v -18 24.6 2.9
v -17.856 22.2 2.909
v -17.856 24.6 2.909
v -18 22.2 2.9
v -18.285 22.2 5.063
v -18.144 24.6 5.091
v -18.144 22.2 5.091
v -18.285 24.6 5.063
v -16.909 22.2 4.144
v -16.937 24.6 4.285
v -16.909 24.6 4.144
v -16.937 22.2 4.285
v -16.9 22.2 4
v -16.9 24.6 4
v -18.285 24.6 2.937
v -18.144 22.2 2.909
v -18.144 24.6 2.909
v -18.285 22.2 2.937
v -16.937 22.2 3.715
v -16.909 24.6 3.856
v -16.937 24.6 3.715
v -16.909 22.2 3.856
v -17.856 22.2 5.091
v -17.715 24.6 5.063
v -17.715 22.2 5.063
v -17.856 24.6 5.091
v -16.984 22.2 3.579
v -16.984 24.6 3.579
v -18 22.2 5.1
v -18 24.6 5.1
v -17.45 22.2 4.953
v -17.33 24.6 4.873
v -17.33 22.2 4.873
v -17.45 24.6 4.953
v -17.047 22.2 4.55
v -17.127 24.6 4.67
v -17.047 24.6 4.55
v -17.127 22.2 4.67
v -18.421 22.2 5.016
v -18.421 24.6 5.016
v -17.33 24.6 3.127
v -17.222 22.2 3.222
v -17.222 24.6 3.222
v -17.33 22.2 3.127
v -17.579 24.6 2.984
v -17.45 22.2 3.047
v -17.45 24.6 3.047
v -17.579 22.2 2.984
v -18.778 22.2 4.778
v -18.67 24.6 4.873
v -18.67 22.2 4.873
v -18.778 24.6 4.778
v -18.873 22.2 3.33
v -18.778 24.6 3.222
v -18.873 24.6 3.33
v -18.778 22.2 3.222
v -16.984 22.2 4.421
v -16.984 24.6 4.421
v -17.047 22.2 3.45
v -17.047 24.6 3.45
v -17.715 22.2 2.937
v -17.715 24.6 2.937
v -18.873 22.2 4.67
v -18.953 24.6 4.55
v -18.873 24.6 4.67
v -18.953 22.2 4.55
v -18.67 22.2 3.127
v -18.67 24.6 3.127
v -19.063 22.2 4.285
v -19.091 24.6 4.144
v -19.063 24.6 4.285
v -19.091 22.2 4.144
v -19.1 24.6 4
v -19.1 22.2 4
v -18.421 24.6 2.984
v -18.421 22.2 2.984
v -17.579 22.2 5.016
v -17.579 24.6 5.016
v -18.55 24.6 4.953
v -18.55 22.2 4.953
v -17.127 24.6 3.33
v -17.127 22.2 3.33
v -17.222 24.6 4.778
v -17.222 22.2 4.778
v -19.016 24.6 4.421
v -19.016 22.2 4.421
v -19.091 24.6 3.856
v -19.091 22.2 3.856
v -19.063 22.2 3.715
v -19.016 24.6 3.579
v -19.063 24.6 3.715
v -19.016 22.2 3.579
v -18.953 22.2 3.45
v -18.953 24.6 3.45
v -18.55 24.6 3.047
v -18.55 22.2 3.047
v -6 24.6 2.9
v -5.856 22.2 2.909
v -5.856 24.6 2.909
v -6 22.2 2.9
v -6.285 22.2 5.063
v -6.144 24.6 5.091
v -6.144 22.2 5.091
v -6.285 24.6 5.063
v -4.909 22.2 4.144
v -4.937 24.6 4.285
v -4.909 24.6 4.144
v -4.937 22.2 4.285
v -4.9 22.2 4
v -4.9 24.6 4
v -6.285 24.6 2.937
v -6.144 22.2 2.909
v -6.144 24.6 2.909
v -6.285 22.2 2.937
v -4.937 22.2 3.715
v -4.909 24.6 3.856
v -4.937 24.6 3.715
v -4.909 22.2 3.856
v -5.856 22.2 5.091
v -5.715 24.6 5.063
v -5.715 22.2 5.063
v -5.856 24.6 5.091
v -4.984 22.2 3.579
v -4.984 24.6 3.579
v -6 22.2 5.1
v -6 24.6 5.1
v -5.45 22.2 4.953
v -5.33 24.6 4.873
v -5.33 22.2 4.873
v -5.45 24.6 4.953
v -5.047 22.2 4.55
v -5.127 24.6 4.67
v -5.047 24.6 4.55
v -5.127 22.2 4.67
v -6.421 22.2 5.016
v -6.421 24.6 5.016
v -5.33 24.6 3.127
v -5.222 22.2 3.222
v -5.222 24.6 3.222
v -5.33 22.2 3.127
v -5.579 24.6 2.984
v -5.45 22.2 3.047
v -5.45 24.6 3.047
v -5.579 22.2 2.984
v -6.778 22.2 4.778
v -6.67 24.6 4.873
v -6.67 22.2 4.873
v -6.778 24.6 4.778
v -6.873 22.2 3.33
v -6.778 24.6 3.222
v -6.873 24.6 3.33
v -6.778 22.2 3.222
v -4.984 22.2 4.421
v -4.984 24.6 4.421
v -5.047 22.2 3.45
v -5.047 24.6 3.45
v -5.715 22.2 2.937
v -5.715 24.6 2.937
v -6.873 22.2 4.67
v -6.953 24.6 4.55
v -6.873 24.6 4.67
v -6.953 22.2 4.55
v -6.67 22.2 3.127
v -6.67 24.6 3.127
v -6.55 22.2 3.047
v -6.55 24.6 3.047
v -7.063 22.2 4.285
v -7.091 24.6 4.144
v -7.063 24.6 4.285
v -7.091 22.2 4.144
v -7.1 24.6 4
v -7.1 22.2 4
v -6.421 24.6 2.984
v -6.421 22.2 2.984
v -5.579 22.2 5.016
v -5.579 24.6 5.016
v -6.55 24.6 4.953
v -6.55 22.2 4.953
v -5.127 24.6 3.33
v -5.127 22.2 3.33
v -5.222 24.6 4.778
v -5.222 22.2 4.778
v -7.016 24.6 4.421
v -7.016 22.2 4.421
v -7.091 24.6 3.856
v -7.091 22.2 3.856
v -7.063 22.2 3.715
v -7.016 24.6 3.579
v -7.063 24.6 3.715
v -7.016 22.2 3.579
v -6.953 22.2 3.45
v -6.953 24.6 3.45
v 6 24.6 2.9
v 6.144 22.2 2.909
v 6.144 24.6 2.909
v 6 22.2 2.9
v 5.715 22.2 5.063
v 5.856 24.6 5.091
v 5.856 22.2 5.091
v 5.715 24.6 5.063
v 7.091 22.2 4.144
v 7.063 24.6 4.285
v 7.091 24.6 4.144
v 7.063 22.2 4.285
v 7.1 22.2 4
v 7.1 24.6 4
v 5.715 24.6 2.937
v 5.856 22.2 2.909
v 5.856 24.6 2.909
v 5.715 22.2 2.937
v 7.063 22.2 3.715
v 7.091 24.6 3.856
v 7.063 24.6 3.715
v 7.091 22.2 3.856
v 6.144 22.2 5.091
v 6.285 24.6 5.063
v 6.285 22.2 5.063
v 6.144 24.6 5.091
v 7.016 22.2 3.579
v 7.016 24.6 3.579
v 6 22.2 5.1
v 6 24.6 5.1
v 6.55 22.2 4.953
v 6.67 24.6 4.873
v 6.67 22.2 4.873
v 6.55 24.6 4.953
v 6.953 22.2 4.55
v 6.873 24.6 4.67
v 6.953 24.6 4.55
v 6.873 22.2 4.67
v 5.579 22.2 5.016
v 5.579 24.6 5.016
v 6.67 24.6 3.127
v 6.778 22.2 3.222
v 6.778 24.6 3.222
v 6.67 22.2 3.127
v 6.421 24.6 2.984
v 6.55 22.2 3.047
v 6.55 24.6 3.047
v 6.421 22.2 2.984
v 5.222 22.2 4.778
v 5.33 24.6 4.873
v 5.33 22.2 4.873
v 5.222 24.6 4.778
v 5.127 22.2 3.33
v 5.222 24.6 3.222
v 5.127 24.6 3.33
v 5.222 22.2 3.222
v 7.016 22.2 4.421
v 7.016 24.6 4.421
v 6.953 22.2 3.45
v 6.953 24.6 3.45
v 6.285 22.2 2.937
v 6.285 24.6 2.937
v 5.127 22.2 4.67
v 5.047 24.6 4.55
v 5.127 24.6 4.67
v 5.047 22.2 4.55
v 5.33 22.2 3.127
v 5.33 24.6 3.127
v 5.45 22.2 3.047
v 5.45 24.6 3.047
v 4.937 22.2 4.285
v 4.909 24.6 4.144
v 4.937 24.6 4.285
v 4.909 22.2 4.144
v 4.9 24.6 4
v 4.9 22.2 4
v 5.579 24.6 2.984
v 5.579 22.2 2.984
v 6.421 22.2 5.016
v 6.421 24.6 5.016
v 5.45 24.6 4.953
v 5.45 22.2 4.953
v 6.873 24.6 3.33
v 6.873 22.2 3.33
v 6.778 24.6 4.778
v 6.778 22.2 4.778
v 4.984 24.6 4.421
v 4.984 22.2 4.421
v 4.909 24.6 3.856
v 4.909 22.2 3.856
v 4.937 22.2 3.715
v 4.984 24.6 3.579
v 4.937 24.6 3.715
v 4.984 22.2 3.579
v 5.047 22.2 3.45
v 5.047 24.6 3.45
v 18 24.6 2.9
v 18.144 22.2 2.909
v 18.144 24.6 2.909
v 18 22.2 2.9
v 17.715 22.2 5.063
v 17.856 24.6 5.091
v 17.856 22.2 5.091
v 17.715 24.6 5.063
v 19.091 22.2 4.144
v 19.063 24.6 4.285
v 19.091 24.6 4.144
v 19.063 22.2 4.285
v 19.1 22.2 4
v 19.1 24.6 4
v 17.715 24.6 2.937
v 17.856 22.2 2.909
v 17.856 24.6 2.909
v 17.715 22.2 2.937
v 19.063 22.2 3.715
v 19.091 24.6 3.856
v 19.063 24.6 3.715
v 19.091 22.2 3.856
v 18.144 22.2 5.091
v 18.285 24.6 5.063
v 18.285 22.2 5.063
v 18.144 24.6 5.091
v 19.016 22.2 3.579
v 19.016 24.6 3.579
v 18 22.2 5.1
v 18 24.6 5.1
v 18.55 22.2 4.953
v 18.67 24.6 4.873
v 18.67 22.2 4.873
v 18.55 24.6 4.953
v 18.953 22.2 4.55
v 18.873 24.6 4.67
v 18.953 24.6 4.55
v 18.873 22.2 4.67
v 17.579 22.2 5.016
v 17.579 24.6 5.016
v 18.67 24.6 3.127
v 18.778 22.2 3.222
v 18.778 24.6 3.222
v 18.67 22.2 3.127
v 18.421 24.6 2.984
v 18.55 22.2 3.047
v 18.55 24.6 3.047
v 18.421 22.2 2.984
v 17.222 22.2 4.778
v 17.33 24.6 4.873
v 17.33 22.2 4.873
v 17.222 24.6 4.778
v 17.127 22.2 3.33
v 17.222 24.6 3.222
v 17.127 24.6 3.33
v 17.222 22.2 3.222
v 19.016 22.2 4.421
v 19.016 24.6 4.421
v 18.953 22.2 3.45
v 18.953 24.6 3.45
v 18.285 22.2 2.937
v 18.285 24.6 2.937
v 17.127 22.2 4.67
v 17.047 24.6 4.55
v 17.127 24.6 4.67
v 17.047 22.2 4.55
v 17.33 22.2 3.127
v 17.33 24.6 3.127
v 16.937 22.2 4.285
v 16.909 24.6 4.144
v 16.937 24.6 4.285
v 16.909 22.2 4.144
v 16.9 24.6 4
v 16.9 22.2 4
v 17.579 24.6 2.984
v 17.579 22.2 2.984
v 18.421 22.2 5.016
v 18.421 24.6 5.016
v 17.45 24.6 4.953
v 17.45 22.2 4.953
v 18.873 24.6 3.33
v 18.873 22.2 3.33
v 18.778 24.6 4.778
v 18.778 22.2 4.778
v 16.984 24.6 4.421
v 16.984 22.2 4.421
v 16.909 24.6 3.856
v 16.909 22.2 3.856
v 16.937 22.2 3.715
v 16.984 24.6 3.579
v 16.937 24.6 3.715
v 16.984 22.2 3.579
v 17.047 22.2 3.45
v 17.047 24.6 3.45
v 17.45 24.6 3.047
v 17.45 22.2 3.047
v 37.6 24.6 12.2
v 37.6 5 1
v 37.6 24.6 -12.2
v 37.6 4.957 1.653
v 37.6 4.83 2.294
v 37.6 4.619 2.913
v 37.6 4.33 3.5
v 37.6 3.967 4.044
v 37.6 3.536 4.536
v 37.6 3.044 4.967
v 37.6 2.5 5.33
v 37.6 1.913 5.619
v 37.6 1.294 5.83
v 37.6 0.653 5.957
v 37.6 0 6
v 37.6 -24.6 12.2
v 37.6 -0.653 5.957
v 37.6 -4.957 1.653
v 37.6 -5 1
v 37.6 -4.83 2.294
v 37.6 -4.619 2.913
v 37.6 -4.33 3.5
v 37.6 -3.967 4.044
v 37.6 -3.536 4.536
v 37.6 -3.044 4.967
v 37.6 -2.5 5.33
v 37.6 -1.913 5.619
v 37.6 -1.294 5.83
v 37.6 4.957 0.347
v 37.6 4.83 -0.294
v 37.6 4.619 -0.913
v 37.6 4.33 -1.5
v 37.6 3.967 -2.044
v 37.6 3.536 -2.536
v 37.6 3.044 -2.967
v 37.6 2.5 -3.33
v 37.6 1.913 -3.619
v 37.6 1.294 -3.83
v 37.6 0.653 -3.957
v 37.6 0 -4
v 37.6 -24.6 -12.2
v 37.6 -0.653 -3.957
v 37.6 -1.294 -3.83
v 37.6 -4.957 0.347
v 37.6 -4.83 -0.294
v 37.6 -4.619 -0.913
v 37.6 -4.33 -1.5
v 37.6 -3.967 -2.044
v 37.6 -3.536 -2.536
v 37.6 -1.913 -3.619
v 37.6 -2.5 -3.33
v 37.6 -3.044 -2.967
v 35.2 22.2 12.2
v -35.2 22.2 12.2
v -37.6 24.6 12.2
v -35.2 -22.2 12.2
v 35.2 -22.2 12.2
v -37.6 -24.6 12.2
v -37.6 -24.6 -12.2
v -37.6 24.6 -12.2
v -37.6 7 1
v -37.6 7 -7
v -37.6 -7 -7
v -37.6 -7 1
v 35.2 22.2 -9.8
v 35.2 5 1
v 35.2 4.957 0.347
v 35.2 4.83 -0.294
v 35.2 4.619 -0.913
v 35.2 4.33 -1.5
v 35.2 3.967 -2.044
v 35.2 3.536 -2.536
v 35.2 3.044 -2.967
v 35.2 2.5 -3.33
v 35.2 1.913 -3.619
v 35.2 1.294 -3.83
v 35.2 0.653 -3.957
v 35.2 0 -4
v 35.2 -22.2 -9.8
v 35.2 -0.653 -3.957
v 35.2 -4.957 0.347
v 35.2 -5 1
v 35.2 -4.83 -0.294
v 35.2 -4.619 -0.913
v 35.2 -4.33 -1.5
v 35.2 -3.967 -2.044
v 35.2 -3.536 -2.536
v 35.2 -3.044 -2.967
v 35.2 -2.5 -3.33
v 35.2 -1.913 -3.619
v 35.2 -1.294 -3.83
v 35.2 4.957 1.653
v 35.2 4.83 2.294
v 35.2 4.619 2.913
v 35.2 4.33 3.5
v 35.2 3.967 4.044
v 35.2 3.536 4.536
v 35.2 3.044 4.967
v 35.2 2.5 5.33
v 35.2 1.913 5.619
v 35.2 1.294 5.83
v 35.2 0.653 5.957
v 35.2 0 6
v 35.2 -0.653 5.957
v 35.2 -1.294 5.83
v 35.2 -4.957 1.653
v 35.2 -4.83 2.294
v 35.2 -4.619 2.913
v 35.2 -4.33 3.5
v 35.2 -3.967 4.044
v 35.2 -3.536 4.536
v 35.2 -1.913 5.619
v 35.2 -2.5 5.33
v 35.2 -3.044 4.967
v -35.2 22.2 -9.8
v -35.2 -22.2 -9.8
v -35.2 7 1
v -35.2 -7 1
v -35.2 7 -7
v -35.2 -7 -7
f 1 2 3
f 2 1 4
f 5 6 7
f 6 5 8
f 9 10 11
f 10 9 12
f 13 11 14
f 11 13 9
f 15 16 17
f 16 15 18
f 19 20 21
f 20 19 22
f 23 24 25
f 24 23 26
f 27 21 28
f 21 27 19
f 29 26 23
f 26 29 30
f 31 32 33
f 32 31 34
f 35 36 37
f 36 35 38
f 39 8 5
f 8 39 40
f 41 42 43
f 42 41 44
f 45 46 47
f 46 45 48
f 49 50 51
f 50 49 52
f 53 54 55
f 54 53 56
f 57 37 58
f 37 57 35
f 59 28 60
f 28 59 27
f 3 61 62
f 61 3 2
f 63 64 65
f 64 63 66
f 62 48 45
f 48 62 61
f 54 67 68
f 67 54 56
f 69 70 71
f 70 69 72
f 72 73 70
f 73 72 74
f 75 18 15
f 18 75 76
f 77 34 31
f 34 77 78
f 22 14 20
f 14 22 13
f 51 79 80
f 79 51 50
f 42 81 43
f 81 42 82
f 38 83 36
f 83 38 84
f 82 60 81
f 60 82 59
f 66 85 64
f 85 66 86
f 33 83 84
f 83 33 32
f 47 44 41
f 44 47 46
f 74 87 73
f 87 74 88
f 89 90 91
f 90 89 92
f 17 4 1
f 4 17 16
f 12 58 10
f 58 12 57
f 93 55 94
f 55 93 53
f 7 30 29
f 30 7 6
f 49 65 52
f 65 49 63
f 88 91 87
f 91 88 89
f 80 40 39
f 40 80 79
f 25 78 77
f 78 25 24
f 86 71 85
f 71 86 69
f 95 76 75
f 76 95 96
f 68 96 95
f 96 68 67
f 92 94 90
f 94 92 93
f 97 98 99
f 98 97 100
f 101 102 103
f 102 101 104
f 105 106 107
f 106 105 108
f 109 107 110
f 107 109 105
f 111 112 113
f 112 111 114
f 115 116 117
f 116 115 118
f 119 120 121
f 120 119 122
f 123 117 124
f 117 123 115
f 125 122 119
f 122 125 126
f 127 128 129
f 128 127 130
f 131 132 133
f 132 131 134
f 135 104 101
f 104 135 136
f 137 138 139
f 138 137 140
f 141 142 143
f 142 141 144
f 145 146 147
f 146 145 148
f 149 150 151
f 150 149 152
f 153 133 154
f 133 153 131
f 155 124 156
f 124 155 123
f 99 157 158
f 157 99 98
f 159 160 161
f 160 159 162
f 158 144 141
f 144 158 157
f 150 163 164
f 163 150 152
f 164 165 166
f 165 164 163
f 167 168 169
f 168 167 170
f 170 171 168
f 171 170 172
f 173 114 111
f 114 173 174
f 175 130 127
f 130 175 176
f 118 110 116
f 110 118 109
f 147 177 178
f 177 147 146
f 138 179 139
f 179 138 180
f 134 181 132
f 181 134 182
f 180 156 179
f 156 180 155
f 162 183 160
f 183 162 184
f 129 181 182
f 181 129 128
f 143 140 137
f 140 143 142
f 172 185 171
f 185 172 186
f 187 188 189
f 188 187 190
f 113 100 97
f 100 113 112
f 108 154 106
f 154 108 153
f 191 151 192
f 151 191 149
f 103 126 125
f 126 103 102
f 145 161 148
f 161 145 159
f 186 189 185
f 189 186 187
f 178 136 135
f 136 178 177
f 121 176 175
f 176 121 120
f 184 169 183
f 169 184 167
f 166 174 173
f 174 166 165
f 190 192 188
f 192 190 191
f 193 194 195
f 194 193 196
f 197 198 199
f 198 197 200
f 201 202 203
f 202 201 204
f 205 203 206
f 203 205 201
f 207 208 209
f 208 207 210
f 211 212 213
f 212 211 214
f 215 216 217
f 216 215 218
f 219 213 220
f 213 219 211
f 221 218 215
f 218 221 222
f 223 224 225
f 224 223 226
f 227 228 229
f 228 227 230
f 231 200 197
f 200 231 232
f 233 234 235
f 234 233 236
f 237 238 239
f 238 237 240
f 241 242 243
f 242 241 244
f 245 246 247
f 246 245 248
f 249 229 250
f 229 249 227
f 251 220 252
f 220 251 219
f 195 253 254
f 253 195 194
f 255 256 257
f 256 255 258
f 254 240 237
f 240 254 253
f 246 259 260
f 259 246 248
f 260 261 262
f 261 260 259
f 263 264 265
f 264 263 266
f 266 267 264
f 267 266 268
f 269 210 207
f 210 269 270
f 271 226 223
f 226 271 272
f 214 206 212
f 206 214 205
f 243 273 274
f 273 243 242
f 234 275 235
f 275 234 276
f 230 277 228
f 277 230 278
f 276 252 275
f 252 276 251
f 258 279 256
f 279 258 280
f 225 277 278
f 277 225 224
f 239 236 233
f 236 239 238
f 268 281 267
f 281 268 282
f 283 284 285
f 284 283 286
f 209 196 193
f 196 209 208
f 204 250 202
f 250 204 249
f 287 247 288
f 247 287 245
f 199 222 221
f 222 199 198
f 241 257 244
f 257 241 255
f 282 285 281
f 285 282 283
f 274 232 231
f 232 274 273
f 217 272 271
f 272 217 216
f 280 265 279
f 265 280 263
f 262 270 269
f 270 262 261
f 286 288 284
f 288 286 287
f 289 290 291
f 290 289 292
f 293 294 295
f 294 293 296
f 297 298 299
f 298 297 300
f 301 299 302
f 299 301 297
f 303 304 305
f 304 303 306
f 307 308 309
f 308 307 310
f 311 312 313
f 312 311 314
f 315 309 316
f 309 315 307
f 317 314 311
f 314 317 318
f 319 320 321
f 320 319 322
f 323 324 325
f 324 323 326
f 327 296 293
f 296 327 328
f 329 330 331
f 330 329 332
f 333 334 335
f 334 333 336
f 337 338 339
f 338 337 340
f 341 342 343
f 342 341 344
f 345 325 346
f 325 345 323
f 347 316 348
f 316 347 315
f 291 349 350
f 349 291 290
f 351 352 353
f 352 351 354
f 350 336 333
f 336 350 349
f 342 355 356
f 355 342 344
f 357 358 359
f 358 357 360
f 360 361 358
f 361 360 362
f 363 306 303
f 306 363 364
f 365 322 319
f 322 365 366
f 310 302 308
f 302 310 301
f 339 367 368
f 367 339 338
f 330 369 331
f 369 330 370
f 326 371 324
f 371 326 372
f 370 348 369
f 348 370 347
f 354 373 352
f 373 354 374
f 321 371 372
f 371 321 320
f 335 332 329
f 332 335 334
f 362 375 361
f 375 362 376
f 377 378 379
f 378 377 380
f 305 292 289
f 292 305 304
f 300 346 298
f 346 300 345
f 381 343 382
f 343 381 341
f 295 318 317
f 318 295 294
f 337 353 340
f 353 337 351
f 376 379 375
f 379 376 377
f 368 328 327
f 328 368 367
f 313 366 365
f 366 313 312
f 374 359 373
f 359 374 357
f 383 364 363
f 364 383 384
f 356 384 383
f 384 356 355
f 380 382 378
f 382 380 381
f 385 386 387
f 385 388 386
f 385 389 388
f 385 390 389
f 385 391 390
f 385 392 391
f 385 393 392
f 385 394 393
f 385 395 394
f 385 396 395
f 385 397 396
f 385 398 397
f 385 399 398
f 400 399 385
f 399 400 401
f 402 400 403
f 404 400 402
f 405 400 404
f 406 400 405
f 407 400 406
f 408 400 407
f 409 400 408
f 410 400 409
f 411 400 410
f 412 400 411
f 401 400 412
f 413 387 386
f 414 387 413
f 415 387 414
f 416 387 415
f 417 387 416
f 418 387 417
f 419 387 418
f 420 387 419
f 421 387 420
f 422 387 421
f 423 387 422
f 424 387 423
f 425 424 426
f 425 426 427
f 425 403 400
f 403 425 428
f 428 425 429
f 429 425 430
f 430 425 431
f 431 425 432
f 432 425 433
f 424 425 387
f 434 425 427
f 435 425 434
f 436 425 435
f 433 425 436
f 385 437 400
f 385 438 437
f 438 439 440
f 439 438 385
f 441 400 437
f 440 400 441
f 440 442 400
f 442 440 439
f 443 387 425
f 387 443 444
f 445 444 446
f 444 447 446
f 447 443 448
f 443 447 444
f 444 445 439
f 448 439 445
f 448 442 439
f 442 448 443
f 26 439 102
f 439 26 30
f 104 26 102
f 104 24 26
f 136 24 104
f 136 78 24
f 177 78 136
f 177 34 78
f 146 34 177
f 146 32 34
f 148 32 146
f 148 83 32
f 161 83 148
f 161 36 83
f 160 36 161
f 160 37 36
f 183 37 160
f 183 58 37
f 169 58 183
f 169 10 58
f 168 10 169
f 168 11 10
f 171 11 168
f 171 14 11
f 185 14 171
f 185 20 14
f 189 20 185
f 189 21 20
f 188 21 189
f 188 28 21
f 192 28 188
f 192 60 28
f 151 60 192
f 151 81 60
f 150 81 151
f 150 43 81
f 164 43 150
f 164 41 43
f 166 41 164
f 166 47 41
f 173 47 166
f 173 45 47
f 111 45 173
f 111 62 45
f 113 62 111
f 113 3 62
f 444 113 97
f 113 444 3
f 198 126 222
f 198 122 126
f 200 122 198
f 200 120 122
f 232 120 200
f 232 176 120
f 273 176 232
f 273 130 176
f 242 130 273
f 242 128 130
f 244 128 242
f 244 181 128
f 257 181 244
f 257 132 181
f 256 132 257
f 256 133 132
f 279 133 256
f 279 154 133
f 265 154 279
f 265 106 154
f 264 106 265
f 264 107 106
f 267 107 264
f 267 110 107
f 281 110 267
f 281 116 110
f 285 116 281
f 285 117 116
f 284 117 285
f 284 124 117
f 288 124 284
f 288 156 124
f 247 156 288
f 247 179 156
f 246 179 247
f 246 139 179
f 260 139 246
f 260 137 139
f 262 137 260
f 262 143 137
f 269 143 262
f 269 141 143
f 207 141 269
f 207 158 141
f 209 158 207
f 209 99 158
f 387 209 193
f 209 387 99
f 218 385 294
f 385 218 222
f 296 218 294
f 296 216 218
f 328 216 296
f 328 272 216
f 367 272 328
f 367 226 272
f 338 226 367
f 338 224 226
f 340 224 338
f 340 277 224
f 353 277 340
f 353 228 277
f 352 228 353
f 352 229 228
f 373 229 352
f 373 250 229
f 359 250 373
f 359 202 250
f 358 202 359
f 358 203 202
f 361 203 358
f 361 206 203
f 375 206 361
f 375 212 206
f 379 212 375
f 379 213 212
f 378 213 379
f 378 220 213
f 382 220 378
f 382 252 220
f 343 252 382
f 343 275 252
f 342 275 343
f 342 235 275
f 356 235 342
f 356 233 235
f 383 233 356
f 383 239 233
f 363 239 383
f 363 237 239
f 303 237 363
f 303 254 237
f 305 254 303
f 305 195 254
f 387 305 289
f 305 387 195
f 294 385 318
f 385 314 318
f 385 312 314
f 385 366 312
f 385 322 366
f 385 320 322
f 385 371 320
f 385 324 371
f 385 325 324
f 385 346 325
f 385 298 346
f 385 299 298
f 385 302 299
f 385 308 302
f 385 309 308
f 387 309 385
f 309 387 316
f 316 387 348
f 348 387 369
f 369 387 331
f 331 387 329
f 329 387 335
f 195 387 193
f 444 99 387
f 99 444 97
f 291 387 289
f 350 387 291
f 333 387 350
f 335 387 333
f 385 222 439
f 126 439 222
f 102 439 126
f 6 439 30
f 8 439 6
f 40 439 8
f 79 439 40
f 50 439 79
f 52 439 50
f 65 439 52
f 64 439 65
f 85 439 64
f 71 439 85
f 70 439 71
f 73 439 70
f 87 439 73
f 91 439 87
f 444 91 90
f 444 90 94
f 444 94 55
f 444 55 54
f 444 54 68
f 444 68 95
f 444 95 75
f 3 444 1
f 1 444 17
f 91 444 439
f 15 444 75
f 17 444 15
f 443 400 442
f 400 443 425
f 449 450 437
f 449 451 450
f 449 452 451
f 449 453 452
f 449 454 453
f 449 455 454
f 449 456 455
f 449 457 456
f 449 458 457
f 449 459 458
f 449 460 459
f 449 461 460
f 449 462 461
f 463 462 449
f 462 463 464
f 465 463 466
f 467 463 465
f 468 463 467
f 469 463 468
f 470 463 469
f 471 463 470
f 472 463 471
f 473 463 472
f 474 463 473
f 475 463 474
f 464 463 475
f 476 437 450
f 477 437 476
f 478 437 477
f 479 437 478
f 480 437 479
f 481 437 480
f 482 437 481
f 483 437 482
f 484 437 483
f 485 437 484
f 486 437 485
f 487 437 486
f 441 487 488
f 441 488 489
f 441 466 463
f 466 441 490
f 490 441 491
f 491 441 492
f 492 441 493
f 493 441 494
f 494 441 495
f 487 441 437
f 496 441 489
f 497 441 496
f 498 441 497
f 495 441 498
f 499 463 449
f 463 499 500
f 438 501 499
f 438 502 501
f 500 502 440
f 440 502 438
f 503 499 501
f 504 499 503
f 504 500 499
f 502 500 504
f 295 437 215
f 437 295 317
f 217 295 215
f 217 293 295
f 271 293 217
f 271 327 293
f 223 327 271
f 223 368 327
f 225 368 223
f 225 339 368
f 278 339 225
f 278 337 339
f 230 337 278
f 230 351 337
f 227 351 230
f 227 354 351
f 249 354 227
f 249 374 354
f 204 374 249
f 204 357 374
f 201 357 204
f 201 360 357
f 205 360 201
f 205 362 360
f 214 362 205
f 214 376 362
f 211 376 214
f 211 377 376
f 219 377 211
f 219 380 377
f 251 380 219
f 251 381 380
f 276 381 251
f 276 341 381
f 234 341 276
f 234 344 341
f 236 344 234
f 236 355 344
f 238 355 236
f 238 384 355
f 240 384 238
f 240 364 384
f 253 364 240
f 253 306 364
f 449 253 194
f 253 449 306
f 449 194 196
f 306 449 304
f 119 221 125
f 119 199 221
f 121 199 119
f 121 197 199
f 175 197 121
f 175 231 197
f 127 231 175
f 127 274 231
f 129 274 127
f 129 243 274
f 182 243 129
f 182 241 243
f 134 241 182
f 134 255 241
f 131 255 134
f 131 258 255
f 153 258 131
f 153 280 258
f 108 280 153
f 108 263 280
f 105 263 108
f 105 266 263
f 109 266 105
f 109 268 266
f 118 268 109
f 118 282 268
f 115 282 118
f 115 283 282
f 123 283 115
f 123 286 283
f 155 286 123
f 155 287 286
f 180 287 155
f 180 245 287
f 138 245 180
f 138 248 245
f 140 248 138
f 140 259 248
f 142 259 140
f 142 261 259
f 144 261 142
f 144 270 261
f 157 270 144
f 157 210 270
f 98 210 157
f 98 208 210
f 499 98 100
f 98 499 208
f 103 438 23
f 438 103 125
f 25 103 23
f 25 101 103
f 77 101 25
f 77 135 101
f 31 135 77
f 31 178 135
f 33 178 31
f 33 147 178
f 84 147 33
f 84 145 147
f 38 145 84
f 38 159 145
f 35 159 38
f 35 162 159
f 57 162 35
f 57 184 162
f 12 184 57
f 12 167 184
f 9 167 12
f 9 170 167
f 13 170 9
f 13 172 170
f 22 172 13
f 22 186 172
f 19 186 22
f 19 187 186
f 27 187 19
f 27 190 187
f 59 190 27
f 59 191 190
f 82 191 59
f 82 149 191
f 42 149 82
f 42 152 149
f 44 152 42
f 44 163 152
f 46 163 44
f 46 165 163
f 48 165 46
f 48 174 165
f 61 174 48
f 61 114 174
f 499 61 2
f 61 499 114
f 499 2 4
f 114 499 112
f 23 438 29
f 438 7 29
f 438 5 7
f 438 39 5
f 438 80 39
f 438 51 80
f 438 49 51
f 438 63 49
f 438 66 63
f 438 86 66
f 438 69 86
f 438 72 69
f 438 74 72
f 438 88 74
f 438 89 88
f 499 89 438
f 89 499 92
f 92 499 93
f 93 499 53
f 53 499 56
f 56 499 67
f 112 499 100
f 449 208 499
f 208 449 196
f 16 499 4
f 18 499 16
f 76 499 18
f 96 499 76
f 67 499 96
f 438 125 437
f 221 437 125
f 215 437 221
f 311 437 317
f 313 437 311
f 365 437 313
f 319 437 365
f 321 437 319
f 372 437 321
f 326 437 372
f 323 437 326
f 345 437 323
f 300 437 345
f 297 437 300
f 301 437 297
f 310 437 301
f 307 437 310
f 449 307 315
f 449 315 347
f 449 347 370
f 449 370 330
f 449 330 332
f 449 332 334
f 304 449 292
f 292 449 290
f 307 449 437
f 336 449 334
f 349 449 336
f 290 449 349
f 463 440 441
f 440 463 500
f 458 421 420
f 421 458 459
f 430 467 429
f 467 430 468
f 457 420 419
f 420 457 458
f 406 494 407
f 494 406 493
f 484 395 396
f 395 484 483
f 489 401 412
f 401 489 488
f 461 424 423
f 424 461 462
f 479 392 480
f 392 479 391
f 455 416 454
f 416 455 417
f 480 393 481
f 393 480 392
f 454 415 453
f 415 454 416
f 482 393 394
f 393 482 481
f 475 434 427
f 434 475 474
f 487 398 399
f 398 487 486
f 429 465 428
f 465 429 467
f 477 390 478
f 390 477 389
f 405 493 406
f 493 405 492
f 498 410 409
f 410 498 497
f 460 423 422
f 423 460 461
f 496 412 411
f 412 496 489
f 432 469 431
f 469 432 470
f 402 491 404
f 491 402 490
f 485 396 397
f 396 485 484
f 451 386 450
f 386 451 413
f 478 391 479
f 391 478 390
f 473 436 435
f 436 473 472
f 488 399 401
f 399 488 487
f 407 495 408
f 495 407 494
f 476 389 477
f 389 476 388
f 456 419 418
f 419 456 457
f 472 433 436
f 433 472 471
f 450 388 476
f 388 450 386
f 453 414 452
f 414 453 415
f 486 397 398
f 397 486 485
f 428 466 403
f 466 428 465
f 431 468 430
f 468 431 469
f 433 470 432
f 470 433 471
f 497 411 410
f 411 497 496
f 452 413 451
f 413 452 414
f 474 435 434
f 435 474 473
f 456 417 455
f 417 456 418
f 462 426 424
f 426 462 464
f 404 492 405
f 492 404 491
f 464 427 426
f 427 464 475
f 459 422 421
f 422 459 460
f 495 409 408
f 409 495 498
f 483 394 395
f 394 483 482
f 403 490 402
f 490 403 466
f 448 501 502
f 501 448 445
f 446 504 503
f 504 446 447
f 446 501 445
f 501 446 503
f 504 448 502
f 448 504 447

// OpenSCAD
// 参数化业务终端外壳。打印前必须用实际板卡复核尺寸。
$fn = 48;
board = [68, 42, 18];
wall = 2.4;
clearance = 1.2;
outer = [board.x + 2*(wall+clearance), board.y + 2*(wall+clearance), board.z + wall + 4];

module shell() {
  difference() {
    cube(outer, center=true);
    translate([0,0,wall]) cube([outer.x-2*wall, outer.y-2*wall, outer.z], center=true);
    translate([outer.x/2,0,1]) rotate([0,90,0]) cylinder(h=wall*3,d=10,center=true); // 摄像头/线缆
    translate([-outer.x/2,0,-3]) cube([wall*3,14,8],center=true); // USB
    for(x=[-18,-6,6,18]) translate([x,outer.y/2,4]) rotate([90,0,0]) cylinder(h=wall*3,d=2.2,center=true);
  }
}
shell();
